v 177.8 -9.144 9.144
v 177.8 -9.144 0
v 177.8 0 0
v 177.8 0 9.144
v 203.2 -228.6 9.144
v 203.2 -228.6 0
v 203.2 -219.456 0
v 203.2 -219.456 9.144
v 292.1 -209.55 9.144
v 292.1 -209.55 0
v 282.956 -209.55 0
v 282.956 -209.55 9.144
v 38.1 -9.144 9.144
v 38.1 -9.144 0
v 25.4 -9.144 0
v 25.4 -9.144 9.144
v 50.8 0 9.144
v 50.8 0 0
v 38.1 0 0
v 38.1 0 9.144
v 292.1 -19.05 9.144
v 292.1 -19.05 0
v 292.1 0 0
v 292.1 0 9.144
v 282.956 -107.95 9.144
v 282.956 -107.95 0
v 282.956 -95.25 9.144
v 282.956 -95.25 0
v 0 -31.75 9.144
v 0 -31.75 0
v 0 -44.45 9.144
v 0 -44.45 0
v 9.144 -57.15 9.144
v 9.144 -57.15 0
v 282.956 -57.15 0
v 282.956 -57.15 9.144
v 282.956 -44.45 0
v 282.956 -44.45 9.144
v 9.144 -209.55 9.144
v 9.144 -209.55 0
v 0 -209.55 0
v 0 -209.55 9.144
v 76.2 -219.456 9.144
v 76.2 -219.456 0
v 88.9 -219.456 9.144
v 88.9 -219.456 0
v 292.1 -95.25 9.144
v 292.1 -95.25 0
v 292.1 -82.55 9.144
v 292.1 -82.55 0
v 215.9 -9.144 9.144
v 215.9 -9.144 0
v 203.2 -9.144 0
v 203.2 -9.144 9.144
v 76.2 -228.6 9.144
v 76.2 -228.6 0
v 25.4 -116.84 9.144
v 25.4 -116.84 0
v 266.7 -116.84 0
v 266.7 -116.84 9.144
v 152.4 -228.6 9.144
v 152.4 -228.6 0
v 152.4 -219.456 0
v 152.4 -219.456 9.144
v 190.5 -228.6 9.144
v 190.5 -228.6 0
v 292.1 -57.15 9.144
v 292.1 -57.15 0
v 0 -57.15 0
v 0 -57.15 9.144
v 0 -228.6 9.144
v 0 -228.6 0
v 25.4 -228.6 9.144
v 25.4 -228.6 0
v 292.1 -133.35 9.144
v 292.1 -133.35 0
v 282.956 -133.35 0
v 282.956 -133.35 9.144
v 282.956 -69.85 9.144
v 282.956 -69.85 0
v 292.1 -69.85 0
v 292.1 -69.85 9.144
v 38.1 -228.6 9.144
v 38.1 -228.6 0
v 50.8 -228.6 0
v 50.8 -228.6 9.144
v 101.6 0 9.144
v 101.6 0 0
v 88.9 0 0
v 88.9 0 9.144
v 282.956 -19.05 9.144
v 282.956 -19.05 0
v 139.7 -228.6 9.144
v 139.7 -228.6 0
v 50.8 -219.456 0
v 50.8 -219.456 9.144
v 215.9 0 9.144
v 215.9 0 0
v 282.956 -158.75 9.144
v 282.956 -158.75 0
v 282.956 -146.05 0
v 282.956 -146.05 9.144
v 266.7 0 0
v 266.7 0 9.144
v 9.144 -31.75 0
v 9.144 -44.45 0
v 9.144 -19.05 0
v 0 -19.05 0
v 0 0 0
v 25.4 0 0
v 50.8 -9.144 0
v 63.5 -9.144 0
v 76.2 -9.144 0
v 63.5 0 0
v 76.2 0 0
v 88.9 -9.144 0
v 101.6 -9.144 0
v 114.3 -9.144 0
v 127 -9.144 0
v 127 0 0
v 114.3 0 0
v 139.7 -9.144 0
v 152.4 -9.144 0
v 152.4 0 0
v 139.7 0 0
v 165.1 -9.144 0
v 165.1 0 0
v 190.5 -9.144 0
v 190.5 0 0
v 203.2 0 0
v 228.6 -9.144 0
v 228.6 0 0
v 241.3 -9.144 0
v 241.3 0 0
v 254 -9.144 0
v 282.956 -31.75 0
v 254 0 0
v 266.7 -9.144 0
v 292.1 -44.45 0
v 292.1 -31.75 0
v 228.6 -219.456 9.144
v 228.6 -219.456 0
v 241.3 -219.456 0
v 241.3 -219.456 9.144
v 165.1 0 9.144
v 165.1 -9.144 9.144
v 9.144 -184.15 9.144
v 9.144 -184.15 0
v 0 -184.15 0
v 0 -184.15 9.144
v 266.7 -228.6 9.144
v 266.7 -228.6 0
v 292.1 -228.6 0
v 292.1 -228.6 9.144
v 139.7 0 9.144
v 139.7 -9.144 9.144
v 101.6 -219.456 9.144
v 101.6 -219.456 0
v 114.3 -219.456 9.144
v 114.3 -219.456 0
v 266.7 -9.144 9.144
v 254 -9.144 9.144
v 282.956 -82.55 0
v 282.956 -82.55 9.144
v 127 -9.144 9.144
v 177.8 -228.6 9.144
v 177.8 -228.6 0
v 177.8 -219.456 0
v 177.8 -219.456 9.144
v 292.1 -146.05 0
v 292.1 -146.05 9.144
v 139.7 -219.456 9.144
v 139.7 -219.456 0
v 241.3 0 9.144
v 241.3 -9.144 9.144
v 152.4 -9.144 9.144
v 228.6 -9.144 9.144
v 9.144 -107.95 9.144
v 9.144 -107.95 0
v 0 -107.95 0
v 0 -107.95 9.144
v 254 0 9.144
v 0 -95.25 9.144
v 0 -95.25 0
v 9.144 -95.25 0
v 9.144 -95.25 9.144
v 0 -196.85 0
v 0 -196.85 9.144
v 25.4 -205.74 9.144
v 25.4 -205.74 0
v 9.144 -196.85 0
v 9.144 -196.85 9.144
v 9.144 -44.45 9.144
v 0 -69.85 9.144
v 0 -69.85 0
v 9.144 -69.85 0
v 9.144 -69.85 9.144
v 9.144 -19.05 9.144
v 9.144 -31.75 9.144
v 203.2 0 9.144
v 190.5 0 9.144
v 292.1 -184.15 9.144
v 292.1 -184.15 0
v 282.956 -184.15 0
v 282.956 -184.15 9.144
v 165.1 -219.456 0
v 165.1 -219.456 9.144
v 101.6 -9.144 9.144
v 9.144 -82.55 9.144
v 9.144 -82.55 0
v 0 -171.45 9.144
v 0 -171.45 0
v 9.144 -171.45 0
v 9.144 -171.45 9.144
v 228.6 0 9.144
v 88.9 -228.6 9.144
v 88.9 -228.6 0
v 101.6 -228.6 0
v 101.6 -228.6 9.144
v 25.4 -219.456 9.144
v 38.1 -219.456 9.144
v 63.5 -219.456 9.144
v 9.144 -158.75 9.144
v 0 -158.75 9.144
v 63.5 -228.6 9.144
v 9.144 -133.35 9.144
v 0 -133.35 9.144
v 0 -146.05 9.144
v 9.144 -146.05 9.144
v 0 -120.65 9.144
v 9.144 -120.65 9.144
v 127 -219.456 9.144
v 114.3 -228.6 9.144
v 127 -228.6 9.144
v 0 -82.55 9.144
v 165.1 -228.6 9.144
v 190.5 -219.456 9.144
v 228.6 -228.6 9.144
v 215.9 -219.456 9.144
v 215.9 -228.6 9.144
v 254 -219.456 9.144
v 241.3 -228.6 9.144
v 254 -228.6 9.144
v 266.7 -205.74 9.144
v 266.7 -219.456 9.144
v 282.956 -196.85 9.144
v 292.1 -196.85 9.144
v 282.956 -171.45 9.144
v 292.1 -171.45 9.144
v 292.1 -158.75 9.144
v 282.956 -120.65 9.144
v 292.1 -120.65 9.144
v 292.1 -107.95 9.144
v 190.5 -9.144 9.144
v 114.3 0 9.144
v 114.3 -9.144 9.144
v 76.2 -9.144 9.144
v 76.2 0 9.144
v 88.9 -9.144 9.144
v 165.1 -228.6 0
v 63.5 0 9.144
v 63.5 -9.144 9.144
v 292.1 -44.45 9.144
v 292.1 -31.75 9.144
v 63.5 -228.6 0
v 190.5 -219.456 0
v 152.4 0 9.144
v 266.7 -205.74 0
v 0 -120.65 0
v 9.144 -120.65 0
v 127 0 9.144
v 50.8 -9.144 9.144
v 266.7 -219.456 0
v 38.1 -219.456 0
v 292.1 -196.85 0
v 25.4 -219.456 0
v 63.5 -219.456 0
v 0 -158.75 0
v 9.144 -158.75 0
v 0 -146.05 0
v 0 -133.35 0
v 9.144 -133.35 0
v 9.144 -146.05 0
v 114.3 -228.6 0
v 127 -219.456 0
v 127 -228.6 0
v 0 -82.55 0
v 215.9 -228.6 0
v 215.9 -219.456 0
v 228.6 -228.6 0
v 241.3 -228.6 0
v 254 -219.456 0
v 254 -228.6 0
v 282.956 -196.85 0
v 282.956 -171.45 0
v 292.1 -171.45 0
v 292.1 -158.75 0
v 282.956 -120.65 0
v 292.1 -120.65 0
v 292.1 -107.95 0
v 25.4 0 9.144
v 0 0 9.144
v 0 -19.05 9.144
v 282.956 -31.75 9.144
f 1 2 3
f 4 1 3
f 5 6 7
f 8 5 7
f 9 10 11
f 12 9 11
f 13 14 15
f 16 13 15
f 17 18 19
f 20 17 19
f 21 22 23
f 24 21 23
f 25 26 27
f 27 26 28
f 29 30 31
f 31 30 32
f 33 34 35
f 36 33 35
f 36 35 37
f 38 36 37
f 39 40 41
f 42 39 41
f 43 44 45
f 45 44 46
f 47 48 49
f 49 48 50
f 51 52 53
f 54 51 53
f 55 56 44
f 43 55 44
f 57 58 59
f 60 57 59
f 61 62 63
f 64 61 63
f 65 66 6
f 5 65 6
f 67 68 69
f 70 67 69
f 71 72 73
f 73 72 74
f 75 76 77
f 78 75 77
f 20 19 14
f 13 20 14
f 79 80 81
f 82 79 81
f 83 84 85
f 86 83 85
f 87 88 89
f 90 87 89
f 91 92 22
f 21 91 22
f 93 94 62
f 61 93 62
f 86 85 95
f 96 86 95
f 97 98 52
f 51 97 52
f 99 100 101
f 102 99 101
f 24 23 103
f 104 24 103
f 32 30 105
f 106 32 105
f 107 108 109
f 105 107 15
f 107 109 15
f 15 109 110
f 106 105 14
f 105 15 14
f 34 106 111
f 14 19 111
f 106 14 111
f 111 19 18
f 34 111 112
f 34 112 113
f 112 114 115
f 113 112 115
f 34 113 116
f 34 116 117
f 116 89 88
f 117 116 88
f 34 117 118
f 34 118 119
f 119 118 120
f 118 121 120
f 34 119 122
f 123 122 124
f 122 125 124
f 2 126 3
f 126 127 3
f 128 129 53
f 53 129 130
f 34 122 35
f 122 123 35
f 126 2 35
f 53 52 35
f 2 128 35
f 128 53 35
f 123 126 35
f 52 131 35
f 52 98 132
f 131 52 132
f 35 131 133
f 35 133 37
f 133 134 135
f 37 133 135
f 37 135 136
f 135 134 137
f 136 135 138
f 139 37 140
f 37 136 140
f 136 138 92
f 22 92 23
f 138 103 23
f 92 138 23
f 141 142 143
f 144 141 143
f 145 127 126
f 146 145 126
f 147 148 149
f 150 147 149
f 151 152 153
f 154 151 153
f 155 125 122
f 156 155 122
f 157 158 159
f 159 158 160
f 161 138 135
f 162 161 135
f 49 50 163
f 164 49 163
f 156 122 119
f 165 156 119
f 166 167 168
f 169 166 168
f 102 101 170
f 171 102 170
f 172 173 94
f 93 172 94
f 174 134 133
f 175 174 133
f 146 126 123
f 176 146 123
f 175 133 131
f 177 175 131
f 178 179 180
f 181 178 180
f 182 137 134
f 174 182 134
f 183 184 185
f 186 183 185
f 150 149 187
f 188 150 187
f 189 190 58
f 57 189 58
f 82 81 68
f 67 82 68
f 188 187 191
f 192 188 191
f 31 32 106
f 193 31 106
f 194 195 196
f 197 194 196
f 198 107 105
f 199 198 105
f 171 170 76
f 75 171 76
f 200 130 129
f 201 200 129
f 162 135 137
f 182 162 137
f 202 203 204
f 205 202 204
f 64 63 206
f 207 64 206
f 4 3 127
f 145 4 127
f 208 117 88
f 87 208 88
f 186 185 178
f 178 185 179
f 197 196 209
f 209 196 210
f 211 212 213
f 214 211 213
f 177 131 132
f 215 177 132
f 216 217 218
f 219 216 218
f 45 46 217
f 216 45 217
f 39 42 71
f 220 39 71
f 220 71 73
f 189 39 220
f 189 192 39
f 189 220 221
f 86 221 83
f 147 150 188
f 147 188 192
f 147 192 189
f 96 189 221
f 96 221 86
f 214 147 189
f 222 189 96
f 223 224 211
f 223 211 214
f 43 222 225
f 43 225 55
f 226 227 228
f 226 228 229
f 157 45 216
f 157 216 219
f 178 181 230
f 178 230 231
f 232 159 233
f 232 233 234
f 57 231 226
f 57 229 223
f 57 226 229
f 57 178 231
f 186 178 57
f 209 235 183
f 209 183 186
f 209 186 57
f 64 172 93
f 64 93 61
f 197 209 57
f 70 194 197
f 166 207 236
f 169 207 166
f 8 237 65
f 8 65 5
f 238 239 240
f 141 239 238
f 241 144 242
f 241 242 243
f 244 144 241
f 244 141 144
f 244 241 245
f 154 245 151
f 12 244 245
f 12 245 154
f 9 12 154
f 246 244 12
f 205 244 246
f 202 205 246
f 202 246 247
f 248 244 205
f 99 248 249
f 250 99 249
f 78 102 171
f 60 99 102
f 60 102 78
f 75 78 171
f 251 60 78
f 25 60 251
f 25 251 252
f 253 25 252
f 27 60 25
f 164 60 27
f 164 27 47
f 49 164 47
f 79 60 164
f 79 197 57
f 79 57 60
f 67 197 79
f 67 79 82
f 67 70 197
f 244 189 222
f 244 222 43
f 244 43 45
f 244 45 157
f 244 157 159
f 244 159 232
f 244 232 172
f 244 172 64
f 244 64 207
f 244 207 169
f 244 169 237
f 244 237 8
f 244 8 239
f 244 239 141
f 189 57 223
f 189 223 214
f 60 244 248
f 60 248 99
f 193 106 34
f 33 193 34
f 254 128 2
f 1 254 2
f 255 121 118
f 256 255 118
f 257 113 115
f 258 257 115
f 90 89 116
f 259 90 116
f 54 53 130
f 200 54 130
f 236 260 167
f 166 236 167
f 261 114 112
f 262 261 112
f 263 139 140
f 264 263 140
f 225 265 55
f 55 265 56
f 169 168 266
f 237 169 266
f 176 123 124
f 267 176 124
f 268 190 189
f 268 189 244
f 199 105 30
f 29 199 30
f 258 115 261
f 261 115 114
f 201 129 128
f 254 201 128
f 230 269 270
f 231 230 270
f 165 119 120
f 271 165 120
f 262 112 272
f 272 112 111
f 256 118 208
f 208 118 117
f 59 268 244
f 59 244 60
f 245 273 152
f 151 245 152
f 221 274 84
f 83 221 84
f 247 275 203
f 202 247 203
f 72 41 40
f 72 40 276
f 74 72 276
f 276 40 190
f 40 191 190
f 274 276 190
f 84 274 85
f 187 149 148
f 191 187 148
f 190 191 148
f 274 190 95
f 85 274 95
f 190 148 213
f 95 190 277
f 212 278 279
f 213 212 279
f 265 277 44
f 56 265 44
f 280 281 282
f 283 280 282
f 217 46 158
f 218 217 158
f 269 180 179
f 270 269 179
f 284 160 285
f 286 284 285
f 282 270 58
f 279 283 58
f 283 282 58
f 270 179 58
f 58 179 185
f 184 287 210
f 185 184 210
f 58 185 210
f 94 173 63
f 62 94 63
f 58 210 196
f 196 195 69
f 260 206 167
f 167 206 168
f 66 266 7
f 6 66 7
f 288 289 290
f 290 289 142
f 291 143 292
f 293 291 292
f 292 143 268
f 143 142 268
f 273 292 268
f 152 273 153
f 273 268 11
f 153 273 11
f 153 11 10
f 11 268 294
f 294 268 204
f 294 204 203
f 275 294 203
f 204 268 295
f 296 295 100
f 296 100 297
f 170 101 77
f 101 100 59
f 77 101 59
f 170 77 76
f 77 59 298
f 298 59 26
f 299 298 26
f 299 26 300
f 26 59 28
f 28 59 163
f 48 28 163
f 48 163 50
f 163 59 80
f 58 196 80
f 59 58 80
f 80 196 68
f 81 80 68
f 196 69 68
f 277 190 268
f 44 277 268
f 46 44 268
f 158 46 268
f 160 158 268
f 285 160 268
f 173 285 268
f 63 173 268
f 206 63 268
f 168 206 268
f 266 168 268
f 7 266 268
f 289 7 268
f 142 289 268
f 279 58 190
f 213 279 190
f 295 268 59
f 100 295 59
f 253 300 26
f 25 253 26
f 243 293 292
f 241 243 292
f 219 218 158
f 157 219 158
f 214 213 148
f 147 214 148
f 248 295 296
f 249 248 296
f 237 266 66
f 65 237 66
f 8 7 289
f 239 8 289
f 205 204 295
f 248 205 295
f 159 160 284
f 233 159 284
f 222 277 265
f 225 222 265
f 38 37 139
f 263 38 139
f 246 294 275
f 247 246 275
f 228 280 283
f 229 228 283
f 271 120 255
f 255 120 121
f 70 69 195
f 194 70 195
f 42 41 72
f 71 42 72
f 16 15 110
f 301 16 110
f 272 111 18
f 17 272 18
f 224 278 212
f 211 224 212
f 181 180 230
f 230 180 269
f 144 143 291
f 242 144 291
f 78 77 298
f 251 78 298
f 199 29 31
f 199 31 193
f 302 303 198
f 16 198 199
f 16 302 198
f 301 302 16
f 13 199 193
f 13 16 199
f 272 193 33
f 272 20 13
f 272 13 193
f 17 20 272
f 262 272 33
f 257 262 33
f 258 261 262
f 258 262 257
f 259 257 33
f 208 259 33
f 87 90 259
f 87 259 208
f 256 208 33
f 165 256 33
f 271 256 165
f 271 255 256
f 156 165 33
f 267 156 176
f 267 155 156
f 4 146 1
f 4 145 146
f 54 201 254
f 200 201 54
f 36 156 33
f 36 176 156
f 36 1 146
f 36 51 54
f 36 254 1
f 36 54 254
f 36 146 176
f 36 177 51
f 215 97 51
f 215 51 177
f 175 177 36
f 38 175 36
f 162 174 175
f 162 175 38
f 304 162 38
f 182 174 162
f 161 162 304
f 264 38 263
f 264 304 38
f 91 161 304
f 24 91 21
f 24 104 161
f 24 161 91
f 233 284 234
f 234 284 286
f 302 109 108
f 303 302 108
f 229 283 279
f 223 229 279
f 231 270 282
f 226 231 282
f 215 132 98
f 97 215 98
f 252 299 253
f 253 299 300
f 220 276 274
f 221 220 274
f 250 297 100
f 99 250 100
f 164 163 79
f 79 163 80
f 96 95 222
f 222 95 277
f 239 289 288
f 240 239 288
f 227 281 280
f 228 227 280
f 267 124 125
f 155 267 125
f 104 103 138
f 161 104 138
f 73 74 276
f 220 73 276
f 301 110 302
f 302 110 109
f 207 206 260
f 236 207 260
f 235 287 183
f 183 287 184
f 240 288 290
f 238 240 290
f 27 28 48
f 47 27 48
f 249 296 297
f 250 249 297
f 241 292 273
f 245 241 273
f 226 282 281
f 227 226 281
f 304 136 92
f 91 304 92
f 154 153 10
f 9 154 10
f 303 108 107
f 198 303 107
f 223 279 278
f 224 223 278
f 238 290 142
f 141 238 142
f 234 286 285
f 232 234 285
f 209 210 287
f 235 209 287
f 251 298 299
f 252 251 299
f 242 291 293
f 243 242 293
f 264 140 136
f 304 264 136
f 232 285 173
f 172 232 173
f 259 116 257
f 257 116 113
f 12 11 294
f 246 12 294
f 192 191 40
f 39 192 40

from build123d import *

# Parameters (mm, degrees)
F1_DEPTH = 9.144
F0_W     = 241.3
F0_H     = 88.9
F2_DEPTH = 9.144


with BuildPart() as f1:
    # F0 (on Top) → F1 (new body)
    with BuildSketch(Plane.XY):
        Polygon((25.4, 0), (0, 0), (0, -19.05), (9.144, -19.05), (9.144, -31.75), (0, -31.75), (0, -44.45), (9.144, -44.45), (9.144, -57.15), (282.956, -57.15), (282.956, -44.45), (292.1, -44.45), (292.1, -31.75), (282.956, -31.75), (282.956, -19.05), (292.1, -19.05), (292.1, 0), (266.7, 0), (266.7, -9.144), (254, -9.144), (254, 0), (241.3, 0), (241.3, -9.144), (228.6, -9.144), (228.6, 0), (215.9, 0), (215.9, -9.144), (203.2, -9.144), (203.2, 0), (190.5, 0), (190.5, -9.144), (177.8, -9.144), (177.8, 0), (165.1, 0), (165.1, -9.144), (152.4, -9.144), (152.4, 0), (139.7, 0), (139.7, -9.144), (127, -9.144), (127, 0), (114.3, 0), (114.3, -9.144), (101.6, -9.144), (101.6, 0), (88.9, 0), (88.9, -9.144), (76.2, -9.144), (76.2, 0), (63.5, 0), (63.5, -9.144), (50.8, -9.144), (50.8, 0), (38.1, 0), (38.1, -9.144), (25.4, -9.144), align=None)
    extrude(amount=F1_DEPTH)


with BuildPart() as f2:
    # F0 (on Top) → F2 (new body)
    with BuildSketch(Plane.XY):
        Polygon((282.956, -57.15), (9.144, -57.15), (0, -57.15), (0, -69.85), (9.144, -69.85), (9.144, -82.55), (0, -82.55), (0, -95.25), (9.144, -95.25), (9.144, -107.95), (0, -107.95), (0, -120.65), (9.144, -120.65), (9.144, -133.35), (0, -133.35), (0, -146.05), (9.144, -146.05), (9.144, -158.75), (0, -158.75), (0, -171.45), (9.144, -171.45), (9.144, -184.15), (0, -184.15), (0, -196.85), (9.144, -196.85), (9.144, -209.55), (0, -209.55), (0, -228.6), (25.4, -228.6), (25.4, -219.456), (38.1, -219.456), (38.1, -228.6), (50.8, -228.6), (50.8, -219.456), (63.5, -219.456), (63.5, -228.6), (76.2, -228.6), (76.2, -219.456), (88.9, -219.456), (88.9, -228.6), (101.6, -228.6), (101.6, -219.456), (114.3, -219.456), (114.3, -228.6), (127, -228.6), (127, -219.456), (139.7, -219.456), (139.7, -228.6), (152.4, -228.6), (152.4, -219.456), (165.1, -219.456), (165.1, -228.6), (177.8, -228.6), (177.8, -219.456), (190.5, -219.456), (190.5, -228.6), (203.2, -228.6), (203.2, -219.456), (215.9, -219.456), (215.9, -228.6), (228.6, -228.6), (228.6, -219.456), (241.3, -219.456), (241.3, -228.6), (254, -228.6), (254, -219.456), (266.7, -219.456), (266.7, -228.6), (292.1, -228.6), (292.1, -209.55), (282.956, -209.55), (282.956, -196.85), (292.1, -196.85), (292.1, -184.15), (282.956, -184.15), (282.956, -171.45), (292.1, -171.45), (292.1, -158.75), (282.956, -158.75), (282.956, -146.05), (292.1, -146.05), (292.1, -133.35), (282.956, -133.35), (282.956, -120.65), (292.1, -120.65), (292.1, -107.95), (282.956, -107.95), (282.956, -95.25), (292.1, -95.25), (292.1, -82.55), (282.956, -82.55), (282.956, -69.85), (292.1, -69.85), (292.1, -57.15), align=None)
        with Locations((146.05, -161.29)):
            Rectangle(F0_W, F0_H, mode=Mode.SUBTRACT)
    extrude(amount=F2_DEPTH)


solid = Compound([f1.part, f2.part])
